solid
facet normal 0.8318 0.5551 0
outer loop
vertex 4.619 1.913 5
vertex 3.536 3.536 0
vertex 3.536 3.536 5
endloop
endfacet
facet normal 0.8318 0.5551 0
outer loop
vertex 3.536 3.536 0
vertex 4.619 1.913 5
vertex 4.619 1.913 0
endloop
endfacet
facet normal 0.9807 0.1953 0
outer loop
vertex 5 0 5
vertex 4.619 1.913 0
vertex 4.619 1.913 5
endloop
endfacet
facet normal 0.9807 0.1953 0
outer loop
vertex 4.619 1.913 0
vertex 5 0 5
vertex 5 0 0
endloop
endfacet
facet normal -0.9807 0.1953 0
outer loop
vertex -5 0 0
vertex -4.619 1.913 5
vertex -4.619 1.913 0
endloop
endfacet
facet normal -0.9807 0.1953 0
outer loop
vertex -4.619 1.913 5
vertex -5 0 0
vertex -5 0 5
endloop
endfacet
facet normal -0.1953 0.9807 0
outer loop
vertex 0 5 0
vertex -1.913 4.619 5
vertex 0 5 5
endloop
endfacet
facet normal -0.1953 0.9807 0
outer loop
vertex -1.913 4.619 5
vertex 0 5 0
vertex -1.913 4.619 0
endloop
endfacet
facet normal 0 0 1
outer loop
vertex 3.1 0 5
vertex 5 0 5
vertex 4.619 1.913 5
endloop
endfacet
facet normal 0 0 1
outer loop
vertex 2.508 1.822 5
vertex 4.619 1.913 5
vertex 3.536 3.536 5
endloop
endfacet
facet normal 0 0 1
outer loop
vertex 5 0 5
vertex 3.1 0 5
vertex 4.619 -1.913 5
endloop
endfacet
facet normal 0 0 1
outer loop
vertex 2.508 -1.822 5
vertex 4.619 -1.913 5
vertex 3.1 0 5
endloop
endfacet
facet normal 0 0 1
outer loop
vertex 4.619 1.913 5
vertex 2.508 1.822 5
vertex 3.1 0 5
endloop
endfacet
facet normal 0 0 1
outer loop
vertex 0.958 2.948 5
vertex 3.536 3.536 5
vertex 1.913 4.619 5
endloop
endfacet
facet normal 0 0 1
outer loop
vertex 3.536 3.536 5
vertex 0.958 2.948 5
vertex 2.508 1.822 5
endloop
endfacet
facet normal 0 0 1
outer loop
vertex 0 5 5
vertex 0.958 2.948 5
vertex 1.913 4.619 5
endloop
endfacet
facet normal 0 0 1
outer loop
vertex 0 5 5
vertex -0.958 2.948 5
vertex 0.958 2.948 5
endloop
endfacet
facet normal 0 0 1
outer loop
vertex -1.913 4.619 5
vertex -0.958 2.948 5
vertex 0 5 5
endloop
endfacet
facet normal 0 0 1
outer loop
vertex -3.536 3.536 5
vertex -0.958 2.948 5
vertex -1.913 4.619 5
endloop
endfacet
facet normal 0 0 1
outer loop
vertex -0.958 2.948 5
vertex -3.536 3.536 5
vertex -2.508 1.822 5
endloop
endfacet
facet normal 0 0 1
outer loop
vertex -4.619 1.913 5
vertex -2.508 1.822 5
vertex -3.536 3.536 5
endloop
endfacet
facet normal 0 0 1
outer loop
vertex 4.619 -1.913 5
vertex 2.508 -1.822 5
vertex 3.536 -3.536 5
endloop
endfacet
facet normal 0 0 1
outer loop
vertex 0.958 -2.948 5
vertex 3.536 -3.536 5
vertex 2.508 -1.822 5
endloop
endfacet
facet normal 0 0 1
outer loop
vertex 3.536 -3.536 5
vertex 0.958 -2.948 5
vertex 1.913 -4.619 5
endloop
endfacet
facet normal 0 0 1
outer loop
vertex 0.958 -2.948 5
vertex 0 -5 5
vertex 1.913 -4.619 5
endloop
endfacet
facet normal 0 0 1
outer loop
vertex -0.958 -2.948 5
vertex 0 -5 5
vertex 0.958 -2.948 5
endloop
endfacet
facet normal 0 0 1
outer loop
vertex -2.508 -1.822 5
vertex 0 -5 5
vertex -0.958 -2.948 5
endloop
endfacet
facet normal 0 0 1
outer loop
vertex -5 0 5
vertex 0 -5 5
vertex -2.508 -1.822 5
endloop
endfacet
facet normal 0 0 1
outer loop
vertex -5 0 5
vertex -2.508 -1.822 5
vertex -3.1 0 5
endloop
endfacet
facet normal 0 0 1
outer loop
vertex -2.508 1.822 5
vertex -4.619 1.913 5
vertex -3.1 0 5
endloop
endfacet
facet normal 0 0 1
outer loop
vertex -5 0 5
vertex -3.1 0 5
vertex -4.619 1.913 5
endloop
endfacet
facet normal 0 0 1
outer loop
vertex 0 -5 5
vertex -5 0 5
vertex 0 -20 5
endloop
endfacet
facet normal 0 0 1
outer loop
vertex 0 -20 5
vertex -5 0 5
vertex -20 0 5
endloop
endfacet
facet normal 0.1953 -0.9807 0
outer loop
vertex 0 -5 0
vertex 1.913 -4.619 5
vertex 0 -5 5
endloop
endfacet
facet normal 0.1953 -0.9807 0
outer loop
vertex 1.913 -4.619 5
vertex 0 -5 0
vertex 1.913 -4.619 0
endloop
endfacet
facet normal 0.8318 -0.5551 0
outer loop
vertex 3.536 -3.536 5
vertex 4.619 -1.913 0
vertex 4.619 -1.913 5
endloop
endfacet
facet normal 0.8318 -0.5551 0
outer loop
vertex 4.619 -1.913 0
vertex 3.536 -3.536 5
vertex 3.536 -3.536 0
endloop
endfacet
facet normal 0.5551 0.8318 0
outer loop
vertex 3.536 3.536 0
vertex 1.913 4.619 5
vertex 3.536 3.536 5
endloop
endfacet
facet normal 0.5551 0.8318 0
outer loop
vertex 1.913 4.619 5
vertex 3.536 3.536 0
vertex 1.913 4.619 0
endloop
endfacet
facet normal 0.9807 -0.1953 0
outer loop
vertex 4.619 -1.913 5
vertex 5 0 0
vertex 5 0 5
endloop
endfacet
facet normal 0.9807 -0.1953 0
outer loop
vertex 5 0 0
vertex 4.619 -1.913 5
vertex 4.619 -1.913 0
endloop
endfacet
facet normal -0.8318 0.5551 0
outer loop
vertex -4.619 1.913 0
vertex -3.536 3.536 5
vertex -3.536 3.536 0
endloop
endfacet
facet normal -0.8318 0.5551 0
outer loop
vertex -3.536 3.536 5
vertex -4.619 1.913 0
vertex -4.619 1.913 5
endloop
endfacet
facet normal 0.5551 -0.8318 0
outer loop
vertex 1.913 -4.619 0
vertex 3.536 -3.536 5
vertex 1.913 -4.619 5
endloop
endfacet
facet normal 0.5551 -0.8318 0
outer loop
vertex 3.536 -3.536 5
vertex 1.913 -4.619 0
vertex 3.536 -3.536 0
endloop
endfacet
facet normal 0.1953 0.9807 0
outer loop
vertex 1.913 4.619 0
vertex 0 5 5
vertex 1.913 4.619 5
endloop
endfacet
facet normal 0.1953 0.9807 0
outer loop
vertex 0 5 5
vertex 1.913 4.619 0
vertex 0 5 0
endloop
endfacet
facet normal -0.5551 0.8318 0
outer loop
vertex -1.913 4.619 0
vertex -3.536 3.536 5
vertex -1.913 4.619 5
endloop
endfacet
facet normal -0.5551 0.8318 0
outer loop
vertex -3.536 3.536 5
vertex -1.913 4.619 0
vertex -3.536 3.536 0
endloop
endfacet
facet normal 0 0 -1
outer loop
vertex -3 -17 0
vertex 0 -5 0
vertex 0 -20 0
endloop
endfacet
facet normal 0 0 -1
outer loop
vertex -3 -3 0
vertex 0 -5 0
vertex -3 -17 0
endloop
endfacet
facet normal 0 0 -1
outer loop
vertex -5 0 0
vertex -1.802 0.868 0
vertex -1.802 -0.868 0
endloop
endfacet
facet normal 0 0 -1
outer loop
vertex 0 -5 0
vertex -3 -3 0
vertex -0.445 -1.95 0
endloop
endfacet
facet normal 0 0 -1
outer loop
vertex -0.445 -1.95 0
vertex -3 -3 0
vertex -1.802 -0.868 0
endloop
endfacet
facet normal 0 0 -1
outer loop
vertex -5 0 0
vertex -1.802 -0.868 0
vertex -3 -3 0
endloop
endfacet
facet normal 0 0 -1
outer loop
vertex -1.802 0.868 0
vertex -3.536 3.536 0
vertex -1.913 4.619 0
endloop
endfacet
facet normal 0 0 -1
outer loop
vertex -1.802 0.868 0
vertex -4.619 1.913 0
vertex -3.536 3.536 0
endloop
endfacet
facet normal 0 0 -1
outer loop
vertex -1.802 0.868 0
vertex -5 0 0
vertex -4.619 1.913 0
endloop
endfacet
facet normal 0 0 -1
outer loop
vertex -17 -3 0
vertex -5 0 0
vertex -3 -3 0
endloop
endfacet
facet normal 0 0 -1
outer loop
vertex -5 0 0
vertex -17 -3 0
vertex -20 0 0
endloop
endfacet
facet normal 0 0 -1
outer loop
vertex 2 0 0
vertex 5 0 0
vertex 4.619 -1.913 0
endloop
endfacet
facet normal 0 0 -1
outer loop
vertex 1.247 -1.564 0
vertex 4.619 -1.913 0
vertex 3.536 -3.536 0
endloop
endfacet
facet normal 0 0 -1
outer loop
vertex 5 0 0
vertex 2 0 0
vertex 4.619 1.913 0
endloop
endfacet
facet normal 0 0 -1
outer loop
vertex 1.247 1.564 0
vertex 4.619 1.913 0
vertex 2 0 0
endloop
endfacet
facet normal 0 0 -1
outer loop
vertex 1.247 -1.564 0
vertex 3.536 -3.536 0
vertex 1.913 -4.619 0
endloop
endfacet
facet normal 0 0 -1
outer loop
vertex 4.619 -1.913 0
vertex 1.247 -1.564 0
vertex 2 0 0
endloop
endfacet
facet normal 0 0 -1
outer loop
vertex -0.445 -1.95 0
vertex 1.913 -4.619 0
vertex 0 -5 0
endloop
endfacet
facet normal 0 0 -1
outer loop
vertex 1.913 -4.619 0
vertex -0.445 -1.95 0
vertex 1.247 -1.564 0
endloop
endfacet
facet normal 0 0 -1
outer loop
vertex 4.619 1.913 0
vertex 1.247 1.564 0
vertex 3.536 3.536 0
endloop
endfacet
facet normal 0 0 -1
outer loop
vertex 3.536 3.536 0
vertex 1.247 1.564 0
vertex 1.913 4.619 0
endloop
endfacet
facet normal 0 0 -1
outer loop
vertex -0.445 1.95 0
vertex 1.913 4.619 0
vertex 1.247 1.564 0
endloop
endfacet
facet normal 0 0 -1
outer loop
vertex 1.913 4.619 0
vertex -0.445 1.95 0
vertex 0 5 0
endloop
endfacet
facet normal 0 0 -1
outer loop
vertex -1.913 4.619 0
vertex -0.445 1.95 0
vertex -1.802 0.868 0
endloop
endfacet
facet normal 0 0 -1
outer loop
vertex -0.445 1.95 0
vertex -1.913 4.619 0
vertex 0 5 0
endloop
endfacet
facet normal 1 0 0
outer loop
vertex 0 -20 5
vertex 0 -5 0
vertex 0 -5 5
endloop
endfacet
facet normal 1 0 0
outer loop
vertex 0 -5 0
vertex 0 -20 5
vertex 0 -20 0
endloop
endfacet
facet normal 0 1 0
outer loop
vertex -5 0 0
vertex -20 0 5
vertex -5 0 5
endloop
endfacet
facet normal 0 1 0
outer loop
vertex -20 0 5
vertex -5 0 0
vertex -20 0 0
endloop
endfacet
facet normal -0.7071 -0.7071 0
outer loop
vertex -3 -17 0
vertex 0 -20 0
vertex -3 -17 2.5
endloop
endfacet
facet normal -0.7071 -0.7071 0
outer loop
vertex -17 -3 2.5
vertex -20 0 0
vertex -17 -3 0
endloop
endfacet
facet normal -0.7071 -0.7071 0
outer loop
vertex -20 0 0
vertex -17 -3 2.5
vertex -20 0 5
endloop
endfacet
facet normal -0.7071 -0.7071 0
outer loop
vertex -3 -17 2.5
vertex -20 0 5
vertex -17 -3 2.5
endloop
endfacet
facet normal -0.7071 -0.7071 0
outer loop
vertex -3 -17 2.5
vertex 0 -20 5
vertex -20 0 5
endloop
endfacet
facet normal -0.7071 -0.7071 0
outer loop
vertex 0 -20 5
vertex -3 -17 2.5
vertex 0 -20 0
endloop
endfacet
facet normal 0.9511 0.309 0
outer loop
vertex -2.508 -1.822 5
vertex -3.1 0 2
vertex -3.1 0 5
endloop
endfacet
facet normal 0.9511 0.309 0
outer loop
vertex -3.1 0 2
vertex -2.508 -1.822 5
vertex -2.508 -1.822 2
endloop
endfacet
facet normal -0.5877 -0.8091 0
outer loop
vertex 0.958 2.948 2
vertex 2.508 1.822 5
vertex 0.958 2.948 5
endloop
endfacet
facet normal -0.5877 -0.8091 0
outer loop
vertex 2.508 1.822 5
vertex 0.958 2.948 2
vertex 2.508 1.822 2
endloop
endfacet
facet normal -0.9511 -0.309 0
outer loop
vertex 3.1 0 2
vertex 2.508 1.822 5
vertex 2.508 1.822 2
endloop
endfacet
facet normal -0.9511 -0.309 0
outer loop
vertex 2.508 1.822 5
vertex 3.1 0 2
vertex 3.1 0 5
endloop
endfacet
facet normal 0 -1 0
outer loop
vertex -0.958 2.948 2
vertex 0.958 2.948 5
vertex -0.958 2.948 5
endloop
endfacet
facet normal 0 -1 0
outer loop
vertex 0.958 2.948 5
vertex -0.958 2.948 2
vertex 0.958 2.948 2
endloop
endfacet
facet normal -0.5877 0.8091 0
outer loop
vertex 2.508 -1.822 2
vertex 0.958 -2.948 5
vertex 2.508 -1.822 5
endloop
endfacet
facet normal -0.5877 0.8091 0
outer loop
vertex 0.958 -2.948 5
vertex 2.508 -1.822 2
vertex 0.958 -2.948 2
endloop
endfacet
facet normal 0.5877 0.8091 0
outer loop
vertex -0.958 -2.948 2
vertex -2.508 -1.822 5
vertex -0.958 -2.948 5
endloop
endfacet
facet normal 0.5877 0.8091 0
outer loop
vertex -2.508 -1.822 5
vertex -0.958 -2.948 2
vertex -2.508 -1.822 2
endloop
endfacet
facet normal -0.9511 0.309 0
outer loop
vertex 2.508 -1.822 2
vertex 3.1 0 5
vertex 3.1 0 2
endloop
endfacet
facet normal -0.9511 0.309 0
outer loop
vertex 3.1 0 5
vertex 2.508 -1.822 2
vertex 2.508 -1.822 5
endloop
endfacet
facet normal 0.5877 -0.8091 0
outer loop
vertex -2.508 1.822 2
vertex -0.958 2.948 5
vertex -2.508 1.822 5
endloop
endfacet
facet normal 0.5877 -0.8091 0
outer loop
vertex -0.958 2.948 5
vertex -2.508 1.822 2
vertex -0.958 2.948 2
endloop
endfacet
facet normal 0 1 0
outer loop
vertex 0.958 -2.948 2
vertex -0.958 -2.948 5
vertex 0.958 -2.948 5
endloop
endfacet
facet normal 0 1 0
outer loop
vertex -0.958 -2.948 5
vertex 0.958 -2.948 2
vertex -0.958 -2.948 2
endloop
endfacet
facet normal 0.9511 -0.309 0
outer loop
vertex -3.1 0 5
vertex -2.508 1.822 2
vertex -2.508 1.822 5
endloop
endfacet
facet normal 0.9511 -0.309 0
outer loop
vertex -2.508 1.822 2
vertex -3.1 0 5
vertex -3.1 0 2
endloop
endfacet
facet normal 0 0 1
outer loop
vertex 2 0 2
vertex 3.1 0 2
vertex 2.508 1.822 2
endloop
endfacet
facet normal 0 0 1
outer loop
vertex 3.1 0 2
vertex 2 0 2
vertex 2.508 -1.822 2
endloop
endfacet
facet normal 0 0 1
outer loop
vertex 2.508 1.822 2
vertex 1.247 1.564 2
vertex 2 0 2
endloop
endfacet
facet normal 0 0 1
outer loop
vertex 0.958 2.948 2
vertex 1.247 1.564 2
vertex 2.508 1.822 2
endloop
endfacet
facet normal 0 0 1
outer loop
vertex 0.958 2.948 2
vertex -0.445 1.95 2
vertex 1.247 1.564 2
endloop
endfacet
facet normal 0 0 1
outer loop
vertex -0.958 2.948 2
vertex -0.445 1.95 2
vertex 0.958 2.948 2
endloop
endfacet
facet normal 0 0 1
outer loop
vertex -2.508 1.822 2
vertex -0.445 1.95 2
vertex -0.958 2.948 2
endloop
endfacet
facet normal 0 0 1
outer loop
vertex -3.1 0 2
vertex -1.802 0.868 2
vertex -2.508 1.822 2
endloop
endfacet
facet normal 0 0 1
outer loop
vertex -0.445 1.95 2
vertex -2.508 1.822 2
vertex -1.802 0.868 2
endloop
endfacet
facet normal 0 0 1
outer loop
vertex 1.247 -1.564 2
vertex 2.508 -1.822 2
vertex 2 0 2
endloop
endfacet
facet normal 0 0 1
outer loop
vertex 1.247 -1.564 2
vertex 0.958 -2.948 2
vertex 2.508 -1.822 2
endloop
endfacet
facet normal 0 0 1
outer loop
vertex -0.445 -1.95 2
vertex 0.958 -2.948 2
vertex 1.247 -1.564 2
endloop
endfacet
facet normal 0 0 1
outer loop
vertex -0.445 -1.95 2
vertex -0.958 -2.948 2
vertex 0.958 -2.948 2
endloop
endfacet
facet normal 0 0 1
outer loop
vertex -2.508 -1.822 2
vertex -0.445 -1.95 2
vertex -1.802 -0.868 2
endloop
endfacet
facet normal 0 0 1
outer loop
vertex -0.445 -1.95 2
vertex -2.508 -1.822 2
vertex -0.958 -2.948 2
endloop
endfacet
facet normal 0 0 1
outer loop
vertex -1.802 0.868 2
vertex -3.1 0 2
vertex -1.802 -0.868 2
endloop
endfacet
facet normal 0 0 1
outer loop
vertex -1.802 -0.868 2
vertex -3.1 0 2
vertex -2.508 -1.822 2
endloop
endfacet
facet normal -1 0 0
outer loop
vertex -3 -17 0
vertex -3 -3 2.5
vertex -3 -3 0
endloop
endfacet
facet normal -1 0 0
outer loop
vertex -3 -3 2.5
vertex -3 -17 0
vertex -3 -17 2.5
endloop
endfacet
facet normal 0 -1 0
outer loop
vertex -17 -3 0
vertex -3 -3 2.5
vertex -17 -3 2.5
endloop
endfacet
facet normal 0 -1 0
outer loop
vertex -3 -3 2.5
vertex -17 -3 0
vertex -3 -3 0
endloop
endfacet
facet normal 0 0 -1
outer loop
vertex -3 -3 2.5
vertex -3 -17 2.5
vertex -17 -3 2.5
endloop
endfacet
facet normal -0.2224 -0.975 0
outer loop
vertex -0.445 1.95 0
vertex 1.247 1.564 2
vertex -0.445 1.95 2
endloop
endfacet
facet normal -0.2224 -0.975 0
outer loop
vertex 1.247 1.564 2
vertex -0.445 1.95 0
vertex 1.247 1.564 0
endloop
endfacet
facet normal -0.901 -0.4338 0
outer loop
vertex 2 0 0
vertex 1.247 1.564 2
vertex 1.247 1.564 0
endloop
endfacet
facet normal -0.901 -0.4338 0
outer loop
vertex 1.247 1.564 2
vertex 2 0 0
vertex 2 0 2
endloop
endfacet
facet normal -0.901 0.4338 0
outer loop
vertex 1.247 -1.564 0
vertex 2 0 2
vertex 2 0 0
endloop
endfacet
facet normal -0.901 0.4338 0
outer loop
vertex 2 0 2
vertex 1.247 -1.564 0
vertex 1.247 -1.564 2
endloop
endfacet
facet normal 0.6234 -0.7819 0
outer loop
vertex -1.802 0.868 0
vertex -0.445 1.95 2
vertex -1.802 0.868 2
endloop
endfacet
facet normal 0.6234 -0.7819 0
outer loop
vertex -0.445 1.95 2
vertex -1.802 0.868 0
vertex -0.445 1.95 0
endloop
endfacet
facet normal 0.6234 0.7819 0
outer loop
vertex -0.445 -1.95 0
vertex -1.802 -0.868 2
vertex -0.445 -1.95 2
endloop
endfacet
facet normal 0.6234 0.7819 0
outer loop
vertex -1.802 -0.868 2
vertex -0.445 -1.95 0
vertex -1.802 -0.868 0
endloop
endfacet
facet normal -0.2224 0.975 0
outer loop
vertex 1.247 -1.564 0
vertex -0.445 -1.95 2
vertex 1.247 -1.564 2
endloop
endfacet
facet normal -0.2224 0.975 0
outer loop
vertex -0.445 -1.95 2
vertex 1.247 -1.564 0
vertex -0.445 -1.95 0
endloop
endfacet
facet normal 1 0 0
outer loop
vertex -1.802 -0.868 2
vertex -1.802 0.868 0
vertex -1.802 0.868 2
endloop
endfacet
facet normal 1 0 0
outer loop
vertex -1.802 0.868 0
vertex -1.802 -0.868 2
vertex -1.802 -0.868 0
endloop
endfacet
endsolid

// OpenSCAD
// [FL_INDEX: keywords="openscad, 3d_parametric, Parametric_glass_bed_holder, csg_solid" | COT="Parametric OpenSCAD design from 3DCodeverse"]
// Title: Parametric glass bed holder

// Width of triangle edges
triangle_width = 20;
// Height of triangle
triangle_height = 5;

// Height of inner triangle difference
tri_offset_height = 2.5;
// Edge of inner triangle difference
tri_offset_width = 17;

// Outer circle radius
circle_radius = 5;
// Screw hole width
screw_hole_width = 2;

// Screwhead diameter
screwhead_diameter = 6.2;
// Screwhead height
screwhead_height = 3;

tri_offset_x = (triangle_width - tri_offset_width);
tri_offset_y = (triangle_width - tri_offset_width);


render (convexity = 1) {
   create_part();
}

module create_part() {

difference() {
  union() {
	cylinder(h = triangle_height, r = circle_radius, center = false);

  	polyhedron(
		points = [
			[0, 0, 0], [0, 0, triangle_height],
			[0, - triangle_width, 0], [0, - triangle_width, triangle_height],
			[- triangle_width, 0, 0], [- triangle_width, 0, triangle_height],
			], 
		triangles = [
			[1,0,2], [1,2,3],
			[0,1,4], [1,5,4],
			[0,4,2], [1,3,5],
			[4,5,3], [3,2,4]
		]
	);
  }
  translate(v=[0, 0, triangle_height-screwhead_height]) {
	cylinder(h = screwhead_height, r = screwhead_diameter/2, center = false);
  }

  polyhedron(
	points = [
		[ - tri_offset_x, - tri_offset_y, -.01], [- tri_offset_x, -tri_offset_y , tri_offset_height],
		[- tri_offset_x, - triangle_width + tri_offset_y - .01, -.01], [- tri_offset_x, - triangle_width - tri_offset_y + .01, tri_offset_height],
		[- triangle_width + tri_offset_x - .01, -tri_offset_y, -.01], [- triangle_width + tri_offset_x - .01, - tri_offset_y, tri_offset_height],
		], 
	triangles = [
		[1,0,2], [1,2,3],
		[0,1,4], [1,5,4],
		[0,4,2], [1,3,5],
		[4,5,3], [3,2,4]
	]
  );
  translate(v = [0, 0, -0.01]) {
  	cylinder(h = triangle_height + 0.02, r = screw_hole_width, center = false);
  }
}

}
